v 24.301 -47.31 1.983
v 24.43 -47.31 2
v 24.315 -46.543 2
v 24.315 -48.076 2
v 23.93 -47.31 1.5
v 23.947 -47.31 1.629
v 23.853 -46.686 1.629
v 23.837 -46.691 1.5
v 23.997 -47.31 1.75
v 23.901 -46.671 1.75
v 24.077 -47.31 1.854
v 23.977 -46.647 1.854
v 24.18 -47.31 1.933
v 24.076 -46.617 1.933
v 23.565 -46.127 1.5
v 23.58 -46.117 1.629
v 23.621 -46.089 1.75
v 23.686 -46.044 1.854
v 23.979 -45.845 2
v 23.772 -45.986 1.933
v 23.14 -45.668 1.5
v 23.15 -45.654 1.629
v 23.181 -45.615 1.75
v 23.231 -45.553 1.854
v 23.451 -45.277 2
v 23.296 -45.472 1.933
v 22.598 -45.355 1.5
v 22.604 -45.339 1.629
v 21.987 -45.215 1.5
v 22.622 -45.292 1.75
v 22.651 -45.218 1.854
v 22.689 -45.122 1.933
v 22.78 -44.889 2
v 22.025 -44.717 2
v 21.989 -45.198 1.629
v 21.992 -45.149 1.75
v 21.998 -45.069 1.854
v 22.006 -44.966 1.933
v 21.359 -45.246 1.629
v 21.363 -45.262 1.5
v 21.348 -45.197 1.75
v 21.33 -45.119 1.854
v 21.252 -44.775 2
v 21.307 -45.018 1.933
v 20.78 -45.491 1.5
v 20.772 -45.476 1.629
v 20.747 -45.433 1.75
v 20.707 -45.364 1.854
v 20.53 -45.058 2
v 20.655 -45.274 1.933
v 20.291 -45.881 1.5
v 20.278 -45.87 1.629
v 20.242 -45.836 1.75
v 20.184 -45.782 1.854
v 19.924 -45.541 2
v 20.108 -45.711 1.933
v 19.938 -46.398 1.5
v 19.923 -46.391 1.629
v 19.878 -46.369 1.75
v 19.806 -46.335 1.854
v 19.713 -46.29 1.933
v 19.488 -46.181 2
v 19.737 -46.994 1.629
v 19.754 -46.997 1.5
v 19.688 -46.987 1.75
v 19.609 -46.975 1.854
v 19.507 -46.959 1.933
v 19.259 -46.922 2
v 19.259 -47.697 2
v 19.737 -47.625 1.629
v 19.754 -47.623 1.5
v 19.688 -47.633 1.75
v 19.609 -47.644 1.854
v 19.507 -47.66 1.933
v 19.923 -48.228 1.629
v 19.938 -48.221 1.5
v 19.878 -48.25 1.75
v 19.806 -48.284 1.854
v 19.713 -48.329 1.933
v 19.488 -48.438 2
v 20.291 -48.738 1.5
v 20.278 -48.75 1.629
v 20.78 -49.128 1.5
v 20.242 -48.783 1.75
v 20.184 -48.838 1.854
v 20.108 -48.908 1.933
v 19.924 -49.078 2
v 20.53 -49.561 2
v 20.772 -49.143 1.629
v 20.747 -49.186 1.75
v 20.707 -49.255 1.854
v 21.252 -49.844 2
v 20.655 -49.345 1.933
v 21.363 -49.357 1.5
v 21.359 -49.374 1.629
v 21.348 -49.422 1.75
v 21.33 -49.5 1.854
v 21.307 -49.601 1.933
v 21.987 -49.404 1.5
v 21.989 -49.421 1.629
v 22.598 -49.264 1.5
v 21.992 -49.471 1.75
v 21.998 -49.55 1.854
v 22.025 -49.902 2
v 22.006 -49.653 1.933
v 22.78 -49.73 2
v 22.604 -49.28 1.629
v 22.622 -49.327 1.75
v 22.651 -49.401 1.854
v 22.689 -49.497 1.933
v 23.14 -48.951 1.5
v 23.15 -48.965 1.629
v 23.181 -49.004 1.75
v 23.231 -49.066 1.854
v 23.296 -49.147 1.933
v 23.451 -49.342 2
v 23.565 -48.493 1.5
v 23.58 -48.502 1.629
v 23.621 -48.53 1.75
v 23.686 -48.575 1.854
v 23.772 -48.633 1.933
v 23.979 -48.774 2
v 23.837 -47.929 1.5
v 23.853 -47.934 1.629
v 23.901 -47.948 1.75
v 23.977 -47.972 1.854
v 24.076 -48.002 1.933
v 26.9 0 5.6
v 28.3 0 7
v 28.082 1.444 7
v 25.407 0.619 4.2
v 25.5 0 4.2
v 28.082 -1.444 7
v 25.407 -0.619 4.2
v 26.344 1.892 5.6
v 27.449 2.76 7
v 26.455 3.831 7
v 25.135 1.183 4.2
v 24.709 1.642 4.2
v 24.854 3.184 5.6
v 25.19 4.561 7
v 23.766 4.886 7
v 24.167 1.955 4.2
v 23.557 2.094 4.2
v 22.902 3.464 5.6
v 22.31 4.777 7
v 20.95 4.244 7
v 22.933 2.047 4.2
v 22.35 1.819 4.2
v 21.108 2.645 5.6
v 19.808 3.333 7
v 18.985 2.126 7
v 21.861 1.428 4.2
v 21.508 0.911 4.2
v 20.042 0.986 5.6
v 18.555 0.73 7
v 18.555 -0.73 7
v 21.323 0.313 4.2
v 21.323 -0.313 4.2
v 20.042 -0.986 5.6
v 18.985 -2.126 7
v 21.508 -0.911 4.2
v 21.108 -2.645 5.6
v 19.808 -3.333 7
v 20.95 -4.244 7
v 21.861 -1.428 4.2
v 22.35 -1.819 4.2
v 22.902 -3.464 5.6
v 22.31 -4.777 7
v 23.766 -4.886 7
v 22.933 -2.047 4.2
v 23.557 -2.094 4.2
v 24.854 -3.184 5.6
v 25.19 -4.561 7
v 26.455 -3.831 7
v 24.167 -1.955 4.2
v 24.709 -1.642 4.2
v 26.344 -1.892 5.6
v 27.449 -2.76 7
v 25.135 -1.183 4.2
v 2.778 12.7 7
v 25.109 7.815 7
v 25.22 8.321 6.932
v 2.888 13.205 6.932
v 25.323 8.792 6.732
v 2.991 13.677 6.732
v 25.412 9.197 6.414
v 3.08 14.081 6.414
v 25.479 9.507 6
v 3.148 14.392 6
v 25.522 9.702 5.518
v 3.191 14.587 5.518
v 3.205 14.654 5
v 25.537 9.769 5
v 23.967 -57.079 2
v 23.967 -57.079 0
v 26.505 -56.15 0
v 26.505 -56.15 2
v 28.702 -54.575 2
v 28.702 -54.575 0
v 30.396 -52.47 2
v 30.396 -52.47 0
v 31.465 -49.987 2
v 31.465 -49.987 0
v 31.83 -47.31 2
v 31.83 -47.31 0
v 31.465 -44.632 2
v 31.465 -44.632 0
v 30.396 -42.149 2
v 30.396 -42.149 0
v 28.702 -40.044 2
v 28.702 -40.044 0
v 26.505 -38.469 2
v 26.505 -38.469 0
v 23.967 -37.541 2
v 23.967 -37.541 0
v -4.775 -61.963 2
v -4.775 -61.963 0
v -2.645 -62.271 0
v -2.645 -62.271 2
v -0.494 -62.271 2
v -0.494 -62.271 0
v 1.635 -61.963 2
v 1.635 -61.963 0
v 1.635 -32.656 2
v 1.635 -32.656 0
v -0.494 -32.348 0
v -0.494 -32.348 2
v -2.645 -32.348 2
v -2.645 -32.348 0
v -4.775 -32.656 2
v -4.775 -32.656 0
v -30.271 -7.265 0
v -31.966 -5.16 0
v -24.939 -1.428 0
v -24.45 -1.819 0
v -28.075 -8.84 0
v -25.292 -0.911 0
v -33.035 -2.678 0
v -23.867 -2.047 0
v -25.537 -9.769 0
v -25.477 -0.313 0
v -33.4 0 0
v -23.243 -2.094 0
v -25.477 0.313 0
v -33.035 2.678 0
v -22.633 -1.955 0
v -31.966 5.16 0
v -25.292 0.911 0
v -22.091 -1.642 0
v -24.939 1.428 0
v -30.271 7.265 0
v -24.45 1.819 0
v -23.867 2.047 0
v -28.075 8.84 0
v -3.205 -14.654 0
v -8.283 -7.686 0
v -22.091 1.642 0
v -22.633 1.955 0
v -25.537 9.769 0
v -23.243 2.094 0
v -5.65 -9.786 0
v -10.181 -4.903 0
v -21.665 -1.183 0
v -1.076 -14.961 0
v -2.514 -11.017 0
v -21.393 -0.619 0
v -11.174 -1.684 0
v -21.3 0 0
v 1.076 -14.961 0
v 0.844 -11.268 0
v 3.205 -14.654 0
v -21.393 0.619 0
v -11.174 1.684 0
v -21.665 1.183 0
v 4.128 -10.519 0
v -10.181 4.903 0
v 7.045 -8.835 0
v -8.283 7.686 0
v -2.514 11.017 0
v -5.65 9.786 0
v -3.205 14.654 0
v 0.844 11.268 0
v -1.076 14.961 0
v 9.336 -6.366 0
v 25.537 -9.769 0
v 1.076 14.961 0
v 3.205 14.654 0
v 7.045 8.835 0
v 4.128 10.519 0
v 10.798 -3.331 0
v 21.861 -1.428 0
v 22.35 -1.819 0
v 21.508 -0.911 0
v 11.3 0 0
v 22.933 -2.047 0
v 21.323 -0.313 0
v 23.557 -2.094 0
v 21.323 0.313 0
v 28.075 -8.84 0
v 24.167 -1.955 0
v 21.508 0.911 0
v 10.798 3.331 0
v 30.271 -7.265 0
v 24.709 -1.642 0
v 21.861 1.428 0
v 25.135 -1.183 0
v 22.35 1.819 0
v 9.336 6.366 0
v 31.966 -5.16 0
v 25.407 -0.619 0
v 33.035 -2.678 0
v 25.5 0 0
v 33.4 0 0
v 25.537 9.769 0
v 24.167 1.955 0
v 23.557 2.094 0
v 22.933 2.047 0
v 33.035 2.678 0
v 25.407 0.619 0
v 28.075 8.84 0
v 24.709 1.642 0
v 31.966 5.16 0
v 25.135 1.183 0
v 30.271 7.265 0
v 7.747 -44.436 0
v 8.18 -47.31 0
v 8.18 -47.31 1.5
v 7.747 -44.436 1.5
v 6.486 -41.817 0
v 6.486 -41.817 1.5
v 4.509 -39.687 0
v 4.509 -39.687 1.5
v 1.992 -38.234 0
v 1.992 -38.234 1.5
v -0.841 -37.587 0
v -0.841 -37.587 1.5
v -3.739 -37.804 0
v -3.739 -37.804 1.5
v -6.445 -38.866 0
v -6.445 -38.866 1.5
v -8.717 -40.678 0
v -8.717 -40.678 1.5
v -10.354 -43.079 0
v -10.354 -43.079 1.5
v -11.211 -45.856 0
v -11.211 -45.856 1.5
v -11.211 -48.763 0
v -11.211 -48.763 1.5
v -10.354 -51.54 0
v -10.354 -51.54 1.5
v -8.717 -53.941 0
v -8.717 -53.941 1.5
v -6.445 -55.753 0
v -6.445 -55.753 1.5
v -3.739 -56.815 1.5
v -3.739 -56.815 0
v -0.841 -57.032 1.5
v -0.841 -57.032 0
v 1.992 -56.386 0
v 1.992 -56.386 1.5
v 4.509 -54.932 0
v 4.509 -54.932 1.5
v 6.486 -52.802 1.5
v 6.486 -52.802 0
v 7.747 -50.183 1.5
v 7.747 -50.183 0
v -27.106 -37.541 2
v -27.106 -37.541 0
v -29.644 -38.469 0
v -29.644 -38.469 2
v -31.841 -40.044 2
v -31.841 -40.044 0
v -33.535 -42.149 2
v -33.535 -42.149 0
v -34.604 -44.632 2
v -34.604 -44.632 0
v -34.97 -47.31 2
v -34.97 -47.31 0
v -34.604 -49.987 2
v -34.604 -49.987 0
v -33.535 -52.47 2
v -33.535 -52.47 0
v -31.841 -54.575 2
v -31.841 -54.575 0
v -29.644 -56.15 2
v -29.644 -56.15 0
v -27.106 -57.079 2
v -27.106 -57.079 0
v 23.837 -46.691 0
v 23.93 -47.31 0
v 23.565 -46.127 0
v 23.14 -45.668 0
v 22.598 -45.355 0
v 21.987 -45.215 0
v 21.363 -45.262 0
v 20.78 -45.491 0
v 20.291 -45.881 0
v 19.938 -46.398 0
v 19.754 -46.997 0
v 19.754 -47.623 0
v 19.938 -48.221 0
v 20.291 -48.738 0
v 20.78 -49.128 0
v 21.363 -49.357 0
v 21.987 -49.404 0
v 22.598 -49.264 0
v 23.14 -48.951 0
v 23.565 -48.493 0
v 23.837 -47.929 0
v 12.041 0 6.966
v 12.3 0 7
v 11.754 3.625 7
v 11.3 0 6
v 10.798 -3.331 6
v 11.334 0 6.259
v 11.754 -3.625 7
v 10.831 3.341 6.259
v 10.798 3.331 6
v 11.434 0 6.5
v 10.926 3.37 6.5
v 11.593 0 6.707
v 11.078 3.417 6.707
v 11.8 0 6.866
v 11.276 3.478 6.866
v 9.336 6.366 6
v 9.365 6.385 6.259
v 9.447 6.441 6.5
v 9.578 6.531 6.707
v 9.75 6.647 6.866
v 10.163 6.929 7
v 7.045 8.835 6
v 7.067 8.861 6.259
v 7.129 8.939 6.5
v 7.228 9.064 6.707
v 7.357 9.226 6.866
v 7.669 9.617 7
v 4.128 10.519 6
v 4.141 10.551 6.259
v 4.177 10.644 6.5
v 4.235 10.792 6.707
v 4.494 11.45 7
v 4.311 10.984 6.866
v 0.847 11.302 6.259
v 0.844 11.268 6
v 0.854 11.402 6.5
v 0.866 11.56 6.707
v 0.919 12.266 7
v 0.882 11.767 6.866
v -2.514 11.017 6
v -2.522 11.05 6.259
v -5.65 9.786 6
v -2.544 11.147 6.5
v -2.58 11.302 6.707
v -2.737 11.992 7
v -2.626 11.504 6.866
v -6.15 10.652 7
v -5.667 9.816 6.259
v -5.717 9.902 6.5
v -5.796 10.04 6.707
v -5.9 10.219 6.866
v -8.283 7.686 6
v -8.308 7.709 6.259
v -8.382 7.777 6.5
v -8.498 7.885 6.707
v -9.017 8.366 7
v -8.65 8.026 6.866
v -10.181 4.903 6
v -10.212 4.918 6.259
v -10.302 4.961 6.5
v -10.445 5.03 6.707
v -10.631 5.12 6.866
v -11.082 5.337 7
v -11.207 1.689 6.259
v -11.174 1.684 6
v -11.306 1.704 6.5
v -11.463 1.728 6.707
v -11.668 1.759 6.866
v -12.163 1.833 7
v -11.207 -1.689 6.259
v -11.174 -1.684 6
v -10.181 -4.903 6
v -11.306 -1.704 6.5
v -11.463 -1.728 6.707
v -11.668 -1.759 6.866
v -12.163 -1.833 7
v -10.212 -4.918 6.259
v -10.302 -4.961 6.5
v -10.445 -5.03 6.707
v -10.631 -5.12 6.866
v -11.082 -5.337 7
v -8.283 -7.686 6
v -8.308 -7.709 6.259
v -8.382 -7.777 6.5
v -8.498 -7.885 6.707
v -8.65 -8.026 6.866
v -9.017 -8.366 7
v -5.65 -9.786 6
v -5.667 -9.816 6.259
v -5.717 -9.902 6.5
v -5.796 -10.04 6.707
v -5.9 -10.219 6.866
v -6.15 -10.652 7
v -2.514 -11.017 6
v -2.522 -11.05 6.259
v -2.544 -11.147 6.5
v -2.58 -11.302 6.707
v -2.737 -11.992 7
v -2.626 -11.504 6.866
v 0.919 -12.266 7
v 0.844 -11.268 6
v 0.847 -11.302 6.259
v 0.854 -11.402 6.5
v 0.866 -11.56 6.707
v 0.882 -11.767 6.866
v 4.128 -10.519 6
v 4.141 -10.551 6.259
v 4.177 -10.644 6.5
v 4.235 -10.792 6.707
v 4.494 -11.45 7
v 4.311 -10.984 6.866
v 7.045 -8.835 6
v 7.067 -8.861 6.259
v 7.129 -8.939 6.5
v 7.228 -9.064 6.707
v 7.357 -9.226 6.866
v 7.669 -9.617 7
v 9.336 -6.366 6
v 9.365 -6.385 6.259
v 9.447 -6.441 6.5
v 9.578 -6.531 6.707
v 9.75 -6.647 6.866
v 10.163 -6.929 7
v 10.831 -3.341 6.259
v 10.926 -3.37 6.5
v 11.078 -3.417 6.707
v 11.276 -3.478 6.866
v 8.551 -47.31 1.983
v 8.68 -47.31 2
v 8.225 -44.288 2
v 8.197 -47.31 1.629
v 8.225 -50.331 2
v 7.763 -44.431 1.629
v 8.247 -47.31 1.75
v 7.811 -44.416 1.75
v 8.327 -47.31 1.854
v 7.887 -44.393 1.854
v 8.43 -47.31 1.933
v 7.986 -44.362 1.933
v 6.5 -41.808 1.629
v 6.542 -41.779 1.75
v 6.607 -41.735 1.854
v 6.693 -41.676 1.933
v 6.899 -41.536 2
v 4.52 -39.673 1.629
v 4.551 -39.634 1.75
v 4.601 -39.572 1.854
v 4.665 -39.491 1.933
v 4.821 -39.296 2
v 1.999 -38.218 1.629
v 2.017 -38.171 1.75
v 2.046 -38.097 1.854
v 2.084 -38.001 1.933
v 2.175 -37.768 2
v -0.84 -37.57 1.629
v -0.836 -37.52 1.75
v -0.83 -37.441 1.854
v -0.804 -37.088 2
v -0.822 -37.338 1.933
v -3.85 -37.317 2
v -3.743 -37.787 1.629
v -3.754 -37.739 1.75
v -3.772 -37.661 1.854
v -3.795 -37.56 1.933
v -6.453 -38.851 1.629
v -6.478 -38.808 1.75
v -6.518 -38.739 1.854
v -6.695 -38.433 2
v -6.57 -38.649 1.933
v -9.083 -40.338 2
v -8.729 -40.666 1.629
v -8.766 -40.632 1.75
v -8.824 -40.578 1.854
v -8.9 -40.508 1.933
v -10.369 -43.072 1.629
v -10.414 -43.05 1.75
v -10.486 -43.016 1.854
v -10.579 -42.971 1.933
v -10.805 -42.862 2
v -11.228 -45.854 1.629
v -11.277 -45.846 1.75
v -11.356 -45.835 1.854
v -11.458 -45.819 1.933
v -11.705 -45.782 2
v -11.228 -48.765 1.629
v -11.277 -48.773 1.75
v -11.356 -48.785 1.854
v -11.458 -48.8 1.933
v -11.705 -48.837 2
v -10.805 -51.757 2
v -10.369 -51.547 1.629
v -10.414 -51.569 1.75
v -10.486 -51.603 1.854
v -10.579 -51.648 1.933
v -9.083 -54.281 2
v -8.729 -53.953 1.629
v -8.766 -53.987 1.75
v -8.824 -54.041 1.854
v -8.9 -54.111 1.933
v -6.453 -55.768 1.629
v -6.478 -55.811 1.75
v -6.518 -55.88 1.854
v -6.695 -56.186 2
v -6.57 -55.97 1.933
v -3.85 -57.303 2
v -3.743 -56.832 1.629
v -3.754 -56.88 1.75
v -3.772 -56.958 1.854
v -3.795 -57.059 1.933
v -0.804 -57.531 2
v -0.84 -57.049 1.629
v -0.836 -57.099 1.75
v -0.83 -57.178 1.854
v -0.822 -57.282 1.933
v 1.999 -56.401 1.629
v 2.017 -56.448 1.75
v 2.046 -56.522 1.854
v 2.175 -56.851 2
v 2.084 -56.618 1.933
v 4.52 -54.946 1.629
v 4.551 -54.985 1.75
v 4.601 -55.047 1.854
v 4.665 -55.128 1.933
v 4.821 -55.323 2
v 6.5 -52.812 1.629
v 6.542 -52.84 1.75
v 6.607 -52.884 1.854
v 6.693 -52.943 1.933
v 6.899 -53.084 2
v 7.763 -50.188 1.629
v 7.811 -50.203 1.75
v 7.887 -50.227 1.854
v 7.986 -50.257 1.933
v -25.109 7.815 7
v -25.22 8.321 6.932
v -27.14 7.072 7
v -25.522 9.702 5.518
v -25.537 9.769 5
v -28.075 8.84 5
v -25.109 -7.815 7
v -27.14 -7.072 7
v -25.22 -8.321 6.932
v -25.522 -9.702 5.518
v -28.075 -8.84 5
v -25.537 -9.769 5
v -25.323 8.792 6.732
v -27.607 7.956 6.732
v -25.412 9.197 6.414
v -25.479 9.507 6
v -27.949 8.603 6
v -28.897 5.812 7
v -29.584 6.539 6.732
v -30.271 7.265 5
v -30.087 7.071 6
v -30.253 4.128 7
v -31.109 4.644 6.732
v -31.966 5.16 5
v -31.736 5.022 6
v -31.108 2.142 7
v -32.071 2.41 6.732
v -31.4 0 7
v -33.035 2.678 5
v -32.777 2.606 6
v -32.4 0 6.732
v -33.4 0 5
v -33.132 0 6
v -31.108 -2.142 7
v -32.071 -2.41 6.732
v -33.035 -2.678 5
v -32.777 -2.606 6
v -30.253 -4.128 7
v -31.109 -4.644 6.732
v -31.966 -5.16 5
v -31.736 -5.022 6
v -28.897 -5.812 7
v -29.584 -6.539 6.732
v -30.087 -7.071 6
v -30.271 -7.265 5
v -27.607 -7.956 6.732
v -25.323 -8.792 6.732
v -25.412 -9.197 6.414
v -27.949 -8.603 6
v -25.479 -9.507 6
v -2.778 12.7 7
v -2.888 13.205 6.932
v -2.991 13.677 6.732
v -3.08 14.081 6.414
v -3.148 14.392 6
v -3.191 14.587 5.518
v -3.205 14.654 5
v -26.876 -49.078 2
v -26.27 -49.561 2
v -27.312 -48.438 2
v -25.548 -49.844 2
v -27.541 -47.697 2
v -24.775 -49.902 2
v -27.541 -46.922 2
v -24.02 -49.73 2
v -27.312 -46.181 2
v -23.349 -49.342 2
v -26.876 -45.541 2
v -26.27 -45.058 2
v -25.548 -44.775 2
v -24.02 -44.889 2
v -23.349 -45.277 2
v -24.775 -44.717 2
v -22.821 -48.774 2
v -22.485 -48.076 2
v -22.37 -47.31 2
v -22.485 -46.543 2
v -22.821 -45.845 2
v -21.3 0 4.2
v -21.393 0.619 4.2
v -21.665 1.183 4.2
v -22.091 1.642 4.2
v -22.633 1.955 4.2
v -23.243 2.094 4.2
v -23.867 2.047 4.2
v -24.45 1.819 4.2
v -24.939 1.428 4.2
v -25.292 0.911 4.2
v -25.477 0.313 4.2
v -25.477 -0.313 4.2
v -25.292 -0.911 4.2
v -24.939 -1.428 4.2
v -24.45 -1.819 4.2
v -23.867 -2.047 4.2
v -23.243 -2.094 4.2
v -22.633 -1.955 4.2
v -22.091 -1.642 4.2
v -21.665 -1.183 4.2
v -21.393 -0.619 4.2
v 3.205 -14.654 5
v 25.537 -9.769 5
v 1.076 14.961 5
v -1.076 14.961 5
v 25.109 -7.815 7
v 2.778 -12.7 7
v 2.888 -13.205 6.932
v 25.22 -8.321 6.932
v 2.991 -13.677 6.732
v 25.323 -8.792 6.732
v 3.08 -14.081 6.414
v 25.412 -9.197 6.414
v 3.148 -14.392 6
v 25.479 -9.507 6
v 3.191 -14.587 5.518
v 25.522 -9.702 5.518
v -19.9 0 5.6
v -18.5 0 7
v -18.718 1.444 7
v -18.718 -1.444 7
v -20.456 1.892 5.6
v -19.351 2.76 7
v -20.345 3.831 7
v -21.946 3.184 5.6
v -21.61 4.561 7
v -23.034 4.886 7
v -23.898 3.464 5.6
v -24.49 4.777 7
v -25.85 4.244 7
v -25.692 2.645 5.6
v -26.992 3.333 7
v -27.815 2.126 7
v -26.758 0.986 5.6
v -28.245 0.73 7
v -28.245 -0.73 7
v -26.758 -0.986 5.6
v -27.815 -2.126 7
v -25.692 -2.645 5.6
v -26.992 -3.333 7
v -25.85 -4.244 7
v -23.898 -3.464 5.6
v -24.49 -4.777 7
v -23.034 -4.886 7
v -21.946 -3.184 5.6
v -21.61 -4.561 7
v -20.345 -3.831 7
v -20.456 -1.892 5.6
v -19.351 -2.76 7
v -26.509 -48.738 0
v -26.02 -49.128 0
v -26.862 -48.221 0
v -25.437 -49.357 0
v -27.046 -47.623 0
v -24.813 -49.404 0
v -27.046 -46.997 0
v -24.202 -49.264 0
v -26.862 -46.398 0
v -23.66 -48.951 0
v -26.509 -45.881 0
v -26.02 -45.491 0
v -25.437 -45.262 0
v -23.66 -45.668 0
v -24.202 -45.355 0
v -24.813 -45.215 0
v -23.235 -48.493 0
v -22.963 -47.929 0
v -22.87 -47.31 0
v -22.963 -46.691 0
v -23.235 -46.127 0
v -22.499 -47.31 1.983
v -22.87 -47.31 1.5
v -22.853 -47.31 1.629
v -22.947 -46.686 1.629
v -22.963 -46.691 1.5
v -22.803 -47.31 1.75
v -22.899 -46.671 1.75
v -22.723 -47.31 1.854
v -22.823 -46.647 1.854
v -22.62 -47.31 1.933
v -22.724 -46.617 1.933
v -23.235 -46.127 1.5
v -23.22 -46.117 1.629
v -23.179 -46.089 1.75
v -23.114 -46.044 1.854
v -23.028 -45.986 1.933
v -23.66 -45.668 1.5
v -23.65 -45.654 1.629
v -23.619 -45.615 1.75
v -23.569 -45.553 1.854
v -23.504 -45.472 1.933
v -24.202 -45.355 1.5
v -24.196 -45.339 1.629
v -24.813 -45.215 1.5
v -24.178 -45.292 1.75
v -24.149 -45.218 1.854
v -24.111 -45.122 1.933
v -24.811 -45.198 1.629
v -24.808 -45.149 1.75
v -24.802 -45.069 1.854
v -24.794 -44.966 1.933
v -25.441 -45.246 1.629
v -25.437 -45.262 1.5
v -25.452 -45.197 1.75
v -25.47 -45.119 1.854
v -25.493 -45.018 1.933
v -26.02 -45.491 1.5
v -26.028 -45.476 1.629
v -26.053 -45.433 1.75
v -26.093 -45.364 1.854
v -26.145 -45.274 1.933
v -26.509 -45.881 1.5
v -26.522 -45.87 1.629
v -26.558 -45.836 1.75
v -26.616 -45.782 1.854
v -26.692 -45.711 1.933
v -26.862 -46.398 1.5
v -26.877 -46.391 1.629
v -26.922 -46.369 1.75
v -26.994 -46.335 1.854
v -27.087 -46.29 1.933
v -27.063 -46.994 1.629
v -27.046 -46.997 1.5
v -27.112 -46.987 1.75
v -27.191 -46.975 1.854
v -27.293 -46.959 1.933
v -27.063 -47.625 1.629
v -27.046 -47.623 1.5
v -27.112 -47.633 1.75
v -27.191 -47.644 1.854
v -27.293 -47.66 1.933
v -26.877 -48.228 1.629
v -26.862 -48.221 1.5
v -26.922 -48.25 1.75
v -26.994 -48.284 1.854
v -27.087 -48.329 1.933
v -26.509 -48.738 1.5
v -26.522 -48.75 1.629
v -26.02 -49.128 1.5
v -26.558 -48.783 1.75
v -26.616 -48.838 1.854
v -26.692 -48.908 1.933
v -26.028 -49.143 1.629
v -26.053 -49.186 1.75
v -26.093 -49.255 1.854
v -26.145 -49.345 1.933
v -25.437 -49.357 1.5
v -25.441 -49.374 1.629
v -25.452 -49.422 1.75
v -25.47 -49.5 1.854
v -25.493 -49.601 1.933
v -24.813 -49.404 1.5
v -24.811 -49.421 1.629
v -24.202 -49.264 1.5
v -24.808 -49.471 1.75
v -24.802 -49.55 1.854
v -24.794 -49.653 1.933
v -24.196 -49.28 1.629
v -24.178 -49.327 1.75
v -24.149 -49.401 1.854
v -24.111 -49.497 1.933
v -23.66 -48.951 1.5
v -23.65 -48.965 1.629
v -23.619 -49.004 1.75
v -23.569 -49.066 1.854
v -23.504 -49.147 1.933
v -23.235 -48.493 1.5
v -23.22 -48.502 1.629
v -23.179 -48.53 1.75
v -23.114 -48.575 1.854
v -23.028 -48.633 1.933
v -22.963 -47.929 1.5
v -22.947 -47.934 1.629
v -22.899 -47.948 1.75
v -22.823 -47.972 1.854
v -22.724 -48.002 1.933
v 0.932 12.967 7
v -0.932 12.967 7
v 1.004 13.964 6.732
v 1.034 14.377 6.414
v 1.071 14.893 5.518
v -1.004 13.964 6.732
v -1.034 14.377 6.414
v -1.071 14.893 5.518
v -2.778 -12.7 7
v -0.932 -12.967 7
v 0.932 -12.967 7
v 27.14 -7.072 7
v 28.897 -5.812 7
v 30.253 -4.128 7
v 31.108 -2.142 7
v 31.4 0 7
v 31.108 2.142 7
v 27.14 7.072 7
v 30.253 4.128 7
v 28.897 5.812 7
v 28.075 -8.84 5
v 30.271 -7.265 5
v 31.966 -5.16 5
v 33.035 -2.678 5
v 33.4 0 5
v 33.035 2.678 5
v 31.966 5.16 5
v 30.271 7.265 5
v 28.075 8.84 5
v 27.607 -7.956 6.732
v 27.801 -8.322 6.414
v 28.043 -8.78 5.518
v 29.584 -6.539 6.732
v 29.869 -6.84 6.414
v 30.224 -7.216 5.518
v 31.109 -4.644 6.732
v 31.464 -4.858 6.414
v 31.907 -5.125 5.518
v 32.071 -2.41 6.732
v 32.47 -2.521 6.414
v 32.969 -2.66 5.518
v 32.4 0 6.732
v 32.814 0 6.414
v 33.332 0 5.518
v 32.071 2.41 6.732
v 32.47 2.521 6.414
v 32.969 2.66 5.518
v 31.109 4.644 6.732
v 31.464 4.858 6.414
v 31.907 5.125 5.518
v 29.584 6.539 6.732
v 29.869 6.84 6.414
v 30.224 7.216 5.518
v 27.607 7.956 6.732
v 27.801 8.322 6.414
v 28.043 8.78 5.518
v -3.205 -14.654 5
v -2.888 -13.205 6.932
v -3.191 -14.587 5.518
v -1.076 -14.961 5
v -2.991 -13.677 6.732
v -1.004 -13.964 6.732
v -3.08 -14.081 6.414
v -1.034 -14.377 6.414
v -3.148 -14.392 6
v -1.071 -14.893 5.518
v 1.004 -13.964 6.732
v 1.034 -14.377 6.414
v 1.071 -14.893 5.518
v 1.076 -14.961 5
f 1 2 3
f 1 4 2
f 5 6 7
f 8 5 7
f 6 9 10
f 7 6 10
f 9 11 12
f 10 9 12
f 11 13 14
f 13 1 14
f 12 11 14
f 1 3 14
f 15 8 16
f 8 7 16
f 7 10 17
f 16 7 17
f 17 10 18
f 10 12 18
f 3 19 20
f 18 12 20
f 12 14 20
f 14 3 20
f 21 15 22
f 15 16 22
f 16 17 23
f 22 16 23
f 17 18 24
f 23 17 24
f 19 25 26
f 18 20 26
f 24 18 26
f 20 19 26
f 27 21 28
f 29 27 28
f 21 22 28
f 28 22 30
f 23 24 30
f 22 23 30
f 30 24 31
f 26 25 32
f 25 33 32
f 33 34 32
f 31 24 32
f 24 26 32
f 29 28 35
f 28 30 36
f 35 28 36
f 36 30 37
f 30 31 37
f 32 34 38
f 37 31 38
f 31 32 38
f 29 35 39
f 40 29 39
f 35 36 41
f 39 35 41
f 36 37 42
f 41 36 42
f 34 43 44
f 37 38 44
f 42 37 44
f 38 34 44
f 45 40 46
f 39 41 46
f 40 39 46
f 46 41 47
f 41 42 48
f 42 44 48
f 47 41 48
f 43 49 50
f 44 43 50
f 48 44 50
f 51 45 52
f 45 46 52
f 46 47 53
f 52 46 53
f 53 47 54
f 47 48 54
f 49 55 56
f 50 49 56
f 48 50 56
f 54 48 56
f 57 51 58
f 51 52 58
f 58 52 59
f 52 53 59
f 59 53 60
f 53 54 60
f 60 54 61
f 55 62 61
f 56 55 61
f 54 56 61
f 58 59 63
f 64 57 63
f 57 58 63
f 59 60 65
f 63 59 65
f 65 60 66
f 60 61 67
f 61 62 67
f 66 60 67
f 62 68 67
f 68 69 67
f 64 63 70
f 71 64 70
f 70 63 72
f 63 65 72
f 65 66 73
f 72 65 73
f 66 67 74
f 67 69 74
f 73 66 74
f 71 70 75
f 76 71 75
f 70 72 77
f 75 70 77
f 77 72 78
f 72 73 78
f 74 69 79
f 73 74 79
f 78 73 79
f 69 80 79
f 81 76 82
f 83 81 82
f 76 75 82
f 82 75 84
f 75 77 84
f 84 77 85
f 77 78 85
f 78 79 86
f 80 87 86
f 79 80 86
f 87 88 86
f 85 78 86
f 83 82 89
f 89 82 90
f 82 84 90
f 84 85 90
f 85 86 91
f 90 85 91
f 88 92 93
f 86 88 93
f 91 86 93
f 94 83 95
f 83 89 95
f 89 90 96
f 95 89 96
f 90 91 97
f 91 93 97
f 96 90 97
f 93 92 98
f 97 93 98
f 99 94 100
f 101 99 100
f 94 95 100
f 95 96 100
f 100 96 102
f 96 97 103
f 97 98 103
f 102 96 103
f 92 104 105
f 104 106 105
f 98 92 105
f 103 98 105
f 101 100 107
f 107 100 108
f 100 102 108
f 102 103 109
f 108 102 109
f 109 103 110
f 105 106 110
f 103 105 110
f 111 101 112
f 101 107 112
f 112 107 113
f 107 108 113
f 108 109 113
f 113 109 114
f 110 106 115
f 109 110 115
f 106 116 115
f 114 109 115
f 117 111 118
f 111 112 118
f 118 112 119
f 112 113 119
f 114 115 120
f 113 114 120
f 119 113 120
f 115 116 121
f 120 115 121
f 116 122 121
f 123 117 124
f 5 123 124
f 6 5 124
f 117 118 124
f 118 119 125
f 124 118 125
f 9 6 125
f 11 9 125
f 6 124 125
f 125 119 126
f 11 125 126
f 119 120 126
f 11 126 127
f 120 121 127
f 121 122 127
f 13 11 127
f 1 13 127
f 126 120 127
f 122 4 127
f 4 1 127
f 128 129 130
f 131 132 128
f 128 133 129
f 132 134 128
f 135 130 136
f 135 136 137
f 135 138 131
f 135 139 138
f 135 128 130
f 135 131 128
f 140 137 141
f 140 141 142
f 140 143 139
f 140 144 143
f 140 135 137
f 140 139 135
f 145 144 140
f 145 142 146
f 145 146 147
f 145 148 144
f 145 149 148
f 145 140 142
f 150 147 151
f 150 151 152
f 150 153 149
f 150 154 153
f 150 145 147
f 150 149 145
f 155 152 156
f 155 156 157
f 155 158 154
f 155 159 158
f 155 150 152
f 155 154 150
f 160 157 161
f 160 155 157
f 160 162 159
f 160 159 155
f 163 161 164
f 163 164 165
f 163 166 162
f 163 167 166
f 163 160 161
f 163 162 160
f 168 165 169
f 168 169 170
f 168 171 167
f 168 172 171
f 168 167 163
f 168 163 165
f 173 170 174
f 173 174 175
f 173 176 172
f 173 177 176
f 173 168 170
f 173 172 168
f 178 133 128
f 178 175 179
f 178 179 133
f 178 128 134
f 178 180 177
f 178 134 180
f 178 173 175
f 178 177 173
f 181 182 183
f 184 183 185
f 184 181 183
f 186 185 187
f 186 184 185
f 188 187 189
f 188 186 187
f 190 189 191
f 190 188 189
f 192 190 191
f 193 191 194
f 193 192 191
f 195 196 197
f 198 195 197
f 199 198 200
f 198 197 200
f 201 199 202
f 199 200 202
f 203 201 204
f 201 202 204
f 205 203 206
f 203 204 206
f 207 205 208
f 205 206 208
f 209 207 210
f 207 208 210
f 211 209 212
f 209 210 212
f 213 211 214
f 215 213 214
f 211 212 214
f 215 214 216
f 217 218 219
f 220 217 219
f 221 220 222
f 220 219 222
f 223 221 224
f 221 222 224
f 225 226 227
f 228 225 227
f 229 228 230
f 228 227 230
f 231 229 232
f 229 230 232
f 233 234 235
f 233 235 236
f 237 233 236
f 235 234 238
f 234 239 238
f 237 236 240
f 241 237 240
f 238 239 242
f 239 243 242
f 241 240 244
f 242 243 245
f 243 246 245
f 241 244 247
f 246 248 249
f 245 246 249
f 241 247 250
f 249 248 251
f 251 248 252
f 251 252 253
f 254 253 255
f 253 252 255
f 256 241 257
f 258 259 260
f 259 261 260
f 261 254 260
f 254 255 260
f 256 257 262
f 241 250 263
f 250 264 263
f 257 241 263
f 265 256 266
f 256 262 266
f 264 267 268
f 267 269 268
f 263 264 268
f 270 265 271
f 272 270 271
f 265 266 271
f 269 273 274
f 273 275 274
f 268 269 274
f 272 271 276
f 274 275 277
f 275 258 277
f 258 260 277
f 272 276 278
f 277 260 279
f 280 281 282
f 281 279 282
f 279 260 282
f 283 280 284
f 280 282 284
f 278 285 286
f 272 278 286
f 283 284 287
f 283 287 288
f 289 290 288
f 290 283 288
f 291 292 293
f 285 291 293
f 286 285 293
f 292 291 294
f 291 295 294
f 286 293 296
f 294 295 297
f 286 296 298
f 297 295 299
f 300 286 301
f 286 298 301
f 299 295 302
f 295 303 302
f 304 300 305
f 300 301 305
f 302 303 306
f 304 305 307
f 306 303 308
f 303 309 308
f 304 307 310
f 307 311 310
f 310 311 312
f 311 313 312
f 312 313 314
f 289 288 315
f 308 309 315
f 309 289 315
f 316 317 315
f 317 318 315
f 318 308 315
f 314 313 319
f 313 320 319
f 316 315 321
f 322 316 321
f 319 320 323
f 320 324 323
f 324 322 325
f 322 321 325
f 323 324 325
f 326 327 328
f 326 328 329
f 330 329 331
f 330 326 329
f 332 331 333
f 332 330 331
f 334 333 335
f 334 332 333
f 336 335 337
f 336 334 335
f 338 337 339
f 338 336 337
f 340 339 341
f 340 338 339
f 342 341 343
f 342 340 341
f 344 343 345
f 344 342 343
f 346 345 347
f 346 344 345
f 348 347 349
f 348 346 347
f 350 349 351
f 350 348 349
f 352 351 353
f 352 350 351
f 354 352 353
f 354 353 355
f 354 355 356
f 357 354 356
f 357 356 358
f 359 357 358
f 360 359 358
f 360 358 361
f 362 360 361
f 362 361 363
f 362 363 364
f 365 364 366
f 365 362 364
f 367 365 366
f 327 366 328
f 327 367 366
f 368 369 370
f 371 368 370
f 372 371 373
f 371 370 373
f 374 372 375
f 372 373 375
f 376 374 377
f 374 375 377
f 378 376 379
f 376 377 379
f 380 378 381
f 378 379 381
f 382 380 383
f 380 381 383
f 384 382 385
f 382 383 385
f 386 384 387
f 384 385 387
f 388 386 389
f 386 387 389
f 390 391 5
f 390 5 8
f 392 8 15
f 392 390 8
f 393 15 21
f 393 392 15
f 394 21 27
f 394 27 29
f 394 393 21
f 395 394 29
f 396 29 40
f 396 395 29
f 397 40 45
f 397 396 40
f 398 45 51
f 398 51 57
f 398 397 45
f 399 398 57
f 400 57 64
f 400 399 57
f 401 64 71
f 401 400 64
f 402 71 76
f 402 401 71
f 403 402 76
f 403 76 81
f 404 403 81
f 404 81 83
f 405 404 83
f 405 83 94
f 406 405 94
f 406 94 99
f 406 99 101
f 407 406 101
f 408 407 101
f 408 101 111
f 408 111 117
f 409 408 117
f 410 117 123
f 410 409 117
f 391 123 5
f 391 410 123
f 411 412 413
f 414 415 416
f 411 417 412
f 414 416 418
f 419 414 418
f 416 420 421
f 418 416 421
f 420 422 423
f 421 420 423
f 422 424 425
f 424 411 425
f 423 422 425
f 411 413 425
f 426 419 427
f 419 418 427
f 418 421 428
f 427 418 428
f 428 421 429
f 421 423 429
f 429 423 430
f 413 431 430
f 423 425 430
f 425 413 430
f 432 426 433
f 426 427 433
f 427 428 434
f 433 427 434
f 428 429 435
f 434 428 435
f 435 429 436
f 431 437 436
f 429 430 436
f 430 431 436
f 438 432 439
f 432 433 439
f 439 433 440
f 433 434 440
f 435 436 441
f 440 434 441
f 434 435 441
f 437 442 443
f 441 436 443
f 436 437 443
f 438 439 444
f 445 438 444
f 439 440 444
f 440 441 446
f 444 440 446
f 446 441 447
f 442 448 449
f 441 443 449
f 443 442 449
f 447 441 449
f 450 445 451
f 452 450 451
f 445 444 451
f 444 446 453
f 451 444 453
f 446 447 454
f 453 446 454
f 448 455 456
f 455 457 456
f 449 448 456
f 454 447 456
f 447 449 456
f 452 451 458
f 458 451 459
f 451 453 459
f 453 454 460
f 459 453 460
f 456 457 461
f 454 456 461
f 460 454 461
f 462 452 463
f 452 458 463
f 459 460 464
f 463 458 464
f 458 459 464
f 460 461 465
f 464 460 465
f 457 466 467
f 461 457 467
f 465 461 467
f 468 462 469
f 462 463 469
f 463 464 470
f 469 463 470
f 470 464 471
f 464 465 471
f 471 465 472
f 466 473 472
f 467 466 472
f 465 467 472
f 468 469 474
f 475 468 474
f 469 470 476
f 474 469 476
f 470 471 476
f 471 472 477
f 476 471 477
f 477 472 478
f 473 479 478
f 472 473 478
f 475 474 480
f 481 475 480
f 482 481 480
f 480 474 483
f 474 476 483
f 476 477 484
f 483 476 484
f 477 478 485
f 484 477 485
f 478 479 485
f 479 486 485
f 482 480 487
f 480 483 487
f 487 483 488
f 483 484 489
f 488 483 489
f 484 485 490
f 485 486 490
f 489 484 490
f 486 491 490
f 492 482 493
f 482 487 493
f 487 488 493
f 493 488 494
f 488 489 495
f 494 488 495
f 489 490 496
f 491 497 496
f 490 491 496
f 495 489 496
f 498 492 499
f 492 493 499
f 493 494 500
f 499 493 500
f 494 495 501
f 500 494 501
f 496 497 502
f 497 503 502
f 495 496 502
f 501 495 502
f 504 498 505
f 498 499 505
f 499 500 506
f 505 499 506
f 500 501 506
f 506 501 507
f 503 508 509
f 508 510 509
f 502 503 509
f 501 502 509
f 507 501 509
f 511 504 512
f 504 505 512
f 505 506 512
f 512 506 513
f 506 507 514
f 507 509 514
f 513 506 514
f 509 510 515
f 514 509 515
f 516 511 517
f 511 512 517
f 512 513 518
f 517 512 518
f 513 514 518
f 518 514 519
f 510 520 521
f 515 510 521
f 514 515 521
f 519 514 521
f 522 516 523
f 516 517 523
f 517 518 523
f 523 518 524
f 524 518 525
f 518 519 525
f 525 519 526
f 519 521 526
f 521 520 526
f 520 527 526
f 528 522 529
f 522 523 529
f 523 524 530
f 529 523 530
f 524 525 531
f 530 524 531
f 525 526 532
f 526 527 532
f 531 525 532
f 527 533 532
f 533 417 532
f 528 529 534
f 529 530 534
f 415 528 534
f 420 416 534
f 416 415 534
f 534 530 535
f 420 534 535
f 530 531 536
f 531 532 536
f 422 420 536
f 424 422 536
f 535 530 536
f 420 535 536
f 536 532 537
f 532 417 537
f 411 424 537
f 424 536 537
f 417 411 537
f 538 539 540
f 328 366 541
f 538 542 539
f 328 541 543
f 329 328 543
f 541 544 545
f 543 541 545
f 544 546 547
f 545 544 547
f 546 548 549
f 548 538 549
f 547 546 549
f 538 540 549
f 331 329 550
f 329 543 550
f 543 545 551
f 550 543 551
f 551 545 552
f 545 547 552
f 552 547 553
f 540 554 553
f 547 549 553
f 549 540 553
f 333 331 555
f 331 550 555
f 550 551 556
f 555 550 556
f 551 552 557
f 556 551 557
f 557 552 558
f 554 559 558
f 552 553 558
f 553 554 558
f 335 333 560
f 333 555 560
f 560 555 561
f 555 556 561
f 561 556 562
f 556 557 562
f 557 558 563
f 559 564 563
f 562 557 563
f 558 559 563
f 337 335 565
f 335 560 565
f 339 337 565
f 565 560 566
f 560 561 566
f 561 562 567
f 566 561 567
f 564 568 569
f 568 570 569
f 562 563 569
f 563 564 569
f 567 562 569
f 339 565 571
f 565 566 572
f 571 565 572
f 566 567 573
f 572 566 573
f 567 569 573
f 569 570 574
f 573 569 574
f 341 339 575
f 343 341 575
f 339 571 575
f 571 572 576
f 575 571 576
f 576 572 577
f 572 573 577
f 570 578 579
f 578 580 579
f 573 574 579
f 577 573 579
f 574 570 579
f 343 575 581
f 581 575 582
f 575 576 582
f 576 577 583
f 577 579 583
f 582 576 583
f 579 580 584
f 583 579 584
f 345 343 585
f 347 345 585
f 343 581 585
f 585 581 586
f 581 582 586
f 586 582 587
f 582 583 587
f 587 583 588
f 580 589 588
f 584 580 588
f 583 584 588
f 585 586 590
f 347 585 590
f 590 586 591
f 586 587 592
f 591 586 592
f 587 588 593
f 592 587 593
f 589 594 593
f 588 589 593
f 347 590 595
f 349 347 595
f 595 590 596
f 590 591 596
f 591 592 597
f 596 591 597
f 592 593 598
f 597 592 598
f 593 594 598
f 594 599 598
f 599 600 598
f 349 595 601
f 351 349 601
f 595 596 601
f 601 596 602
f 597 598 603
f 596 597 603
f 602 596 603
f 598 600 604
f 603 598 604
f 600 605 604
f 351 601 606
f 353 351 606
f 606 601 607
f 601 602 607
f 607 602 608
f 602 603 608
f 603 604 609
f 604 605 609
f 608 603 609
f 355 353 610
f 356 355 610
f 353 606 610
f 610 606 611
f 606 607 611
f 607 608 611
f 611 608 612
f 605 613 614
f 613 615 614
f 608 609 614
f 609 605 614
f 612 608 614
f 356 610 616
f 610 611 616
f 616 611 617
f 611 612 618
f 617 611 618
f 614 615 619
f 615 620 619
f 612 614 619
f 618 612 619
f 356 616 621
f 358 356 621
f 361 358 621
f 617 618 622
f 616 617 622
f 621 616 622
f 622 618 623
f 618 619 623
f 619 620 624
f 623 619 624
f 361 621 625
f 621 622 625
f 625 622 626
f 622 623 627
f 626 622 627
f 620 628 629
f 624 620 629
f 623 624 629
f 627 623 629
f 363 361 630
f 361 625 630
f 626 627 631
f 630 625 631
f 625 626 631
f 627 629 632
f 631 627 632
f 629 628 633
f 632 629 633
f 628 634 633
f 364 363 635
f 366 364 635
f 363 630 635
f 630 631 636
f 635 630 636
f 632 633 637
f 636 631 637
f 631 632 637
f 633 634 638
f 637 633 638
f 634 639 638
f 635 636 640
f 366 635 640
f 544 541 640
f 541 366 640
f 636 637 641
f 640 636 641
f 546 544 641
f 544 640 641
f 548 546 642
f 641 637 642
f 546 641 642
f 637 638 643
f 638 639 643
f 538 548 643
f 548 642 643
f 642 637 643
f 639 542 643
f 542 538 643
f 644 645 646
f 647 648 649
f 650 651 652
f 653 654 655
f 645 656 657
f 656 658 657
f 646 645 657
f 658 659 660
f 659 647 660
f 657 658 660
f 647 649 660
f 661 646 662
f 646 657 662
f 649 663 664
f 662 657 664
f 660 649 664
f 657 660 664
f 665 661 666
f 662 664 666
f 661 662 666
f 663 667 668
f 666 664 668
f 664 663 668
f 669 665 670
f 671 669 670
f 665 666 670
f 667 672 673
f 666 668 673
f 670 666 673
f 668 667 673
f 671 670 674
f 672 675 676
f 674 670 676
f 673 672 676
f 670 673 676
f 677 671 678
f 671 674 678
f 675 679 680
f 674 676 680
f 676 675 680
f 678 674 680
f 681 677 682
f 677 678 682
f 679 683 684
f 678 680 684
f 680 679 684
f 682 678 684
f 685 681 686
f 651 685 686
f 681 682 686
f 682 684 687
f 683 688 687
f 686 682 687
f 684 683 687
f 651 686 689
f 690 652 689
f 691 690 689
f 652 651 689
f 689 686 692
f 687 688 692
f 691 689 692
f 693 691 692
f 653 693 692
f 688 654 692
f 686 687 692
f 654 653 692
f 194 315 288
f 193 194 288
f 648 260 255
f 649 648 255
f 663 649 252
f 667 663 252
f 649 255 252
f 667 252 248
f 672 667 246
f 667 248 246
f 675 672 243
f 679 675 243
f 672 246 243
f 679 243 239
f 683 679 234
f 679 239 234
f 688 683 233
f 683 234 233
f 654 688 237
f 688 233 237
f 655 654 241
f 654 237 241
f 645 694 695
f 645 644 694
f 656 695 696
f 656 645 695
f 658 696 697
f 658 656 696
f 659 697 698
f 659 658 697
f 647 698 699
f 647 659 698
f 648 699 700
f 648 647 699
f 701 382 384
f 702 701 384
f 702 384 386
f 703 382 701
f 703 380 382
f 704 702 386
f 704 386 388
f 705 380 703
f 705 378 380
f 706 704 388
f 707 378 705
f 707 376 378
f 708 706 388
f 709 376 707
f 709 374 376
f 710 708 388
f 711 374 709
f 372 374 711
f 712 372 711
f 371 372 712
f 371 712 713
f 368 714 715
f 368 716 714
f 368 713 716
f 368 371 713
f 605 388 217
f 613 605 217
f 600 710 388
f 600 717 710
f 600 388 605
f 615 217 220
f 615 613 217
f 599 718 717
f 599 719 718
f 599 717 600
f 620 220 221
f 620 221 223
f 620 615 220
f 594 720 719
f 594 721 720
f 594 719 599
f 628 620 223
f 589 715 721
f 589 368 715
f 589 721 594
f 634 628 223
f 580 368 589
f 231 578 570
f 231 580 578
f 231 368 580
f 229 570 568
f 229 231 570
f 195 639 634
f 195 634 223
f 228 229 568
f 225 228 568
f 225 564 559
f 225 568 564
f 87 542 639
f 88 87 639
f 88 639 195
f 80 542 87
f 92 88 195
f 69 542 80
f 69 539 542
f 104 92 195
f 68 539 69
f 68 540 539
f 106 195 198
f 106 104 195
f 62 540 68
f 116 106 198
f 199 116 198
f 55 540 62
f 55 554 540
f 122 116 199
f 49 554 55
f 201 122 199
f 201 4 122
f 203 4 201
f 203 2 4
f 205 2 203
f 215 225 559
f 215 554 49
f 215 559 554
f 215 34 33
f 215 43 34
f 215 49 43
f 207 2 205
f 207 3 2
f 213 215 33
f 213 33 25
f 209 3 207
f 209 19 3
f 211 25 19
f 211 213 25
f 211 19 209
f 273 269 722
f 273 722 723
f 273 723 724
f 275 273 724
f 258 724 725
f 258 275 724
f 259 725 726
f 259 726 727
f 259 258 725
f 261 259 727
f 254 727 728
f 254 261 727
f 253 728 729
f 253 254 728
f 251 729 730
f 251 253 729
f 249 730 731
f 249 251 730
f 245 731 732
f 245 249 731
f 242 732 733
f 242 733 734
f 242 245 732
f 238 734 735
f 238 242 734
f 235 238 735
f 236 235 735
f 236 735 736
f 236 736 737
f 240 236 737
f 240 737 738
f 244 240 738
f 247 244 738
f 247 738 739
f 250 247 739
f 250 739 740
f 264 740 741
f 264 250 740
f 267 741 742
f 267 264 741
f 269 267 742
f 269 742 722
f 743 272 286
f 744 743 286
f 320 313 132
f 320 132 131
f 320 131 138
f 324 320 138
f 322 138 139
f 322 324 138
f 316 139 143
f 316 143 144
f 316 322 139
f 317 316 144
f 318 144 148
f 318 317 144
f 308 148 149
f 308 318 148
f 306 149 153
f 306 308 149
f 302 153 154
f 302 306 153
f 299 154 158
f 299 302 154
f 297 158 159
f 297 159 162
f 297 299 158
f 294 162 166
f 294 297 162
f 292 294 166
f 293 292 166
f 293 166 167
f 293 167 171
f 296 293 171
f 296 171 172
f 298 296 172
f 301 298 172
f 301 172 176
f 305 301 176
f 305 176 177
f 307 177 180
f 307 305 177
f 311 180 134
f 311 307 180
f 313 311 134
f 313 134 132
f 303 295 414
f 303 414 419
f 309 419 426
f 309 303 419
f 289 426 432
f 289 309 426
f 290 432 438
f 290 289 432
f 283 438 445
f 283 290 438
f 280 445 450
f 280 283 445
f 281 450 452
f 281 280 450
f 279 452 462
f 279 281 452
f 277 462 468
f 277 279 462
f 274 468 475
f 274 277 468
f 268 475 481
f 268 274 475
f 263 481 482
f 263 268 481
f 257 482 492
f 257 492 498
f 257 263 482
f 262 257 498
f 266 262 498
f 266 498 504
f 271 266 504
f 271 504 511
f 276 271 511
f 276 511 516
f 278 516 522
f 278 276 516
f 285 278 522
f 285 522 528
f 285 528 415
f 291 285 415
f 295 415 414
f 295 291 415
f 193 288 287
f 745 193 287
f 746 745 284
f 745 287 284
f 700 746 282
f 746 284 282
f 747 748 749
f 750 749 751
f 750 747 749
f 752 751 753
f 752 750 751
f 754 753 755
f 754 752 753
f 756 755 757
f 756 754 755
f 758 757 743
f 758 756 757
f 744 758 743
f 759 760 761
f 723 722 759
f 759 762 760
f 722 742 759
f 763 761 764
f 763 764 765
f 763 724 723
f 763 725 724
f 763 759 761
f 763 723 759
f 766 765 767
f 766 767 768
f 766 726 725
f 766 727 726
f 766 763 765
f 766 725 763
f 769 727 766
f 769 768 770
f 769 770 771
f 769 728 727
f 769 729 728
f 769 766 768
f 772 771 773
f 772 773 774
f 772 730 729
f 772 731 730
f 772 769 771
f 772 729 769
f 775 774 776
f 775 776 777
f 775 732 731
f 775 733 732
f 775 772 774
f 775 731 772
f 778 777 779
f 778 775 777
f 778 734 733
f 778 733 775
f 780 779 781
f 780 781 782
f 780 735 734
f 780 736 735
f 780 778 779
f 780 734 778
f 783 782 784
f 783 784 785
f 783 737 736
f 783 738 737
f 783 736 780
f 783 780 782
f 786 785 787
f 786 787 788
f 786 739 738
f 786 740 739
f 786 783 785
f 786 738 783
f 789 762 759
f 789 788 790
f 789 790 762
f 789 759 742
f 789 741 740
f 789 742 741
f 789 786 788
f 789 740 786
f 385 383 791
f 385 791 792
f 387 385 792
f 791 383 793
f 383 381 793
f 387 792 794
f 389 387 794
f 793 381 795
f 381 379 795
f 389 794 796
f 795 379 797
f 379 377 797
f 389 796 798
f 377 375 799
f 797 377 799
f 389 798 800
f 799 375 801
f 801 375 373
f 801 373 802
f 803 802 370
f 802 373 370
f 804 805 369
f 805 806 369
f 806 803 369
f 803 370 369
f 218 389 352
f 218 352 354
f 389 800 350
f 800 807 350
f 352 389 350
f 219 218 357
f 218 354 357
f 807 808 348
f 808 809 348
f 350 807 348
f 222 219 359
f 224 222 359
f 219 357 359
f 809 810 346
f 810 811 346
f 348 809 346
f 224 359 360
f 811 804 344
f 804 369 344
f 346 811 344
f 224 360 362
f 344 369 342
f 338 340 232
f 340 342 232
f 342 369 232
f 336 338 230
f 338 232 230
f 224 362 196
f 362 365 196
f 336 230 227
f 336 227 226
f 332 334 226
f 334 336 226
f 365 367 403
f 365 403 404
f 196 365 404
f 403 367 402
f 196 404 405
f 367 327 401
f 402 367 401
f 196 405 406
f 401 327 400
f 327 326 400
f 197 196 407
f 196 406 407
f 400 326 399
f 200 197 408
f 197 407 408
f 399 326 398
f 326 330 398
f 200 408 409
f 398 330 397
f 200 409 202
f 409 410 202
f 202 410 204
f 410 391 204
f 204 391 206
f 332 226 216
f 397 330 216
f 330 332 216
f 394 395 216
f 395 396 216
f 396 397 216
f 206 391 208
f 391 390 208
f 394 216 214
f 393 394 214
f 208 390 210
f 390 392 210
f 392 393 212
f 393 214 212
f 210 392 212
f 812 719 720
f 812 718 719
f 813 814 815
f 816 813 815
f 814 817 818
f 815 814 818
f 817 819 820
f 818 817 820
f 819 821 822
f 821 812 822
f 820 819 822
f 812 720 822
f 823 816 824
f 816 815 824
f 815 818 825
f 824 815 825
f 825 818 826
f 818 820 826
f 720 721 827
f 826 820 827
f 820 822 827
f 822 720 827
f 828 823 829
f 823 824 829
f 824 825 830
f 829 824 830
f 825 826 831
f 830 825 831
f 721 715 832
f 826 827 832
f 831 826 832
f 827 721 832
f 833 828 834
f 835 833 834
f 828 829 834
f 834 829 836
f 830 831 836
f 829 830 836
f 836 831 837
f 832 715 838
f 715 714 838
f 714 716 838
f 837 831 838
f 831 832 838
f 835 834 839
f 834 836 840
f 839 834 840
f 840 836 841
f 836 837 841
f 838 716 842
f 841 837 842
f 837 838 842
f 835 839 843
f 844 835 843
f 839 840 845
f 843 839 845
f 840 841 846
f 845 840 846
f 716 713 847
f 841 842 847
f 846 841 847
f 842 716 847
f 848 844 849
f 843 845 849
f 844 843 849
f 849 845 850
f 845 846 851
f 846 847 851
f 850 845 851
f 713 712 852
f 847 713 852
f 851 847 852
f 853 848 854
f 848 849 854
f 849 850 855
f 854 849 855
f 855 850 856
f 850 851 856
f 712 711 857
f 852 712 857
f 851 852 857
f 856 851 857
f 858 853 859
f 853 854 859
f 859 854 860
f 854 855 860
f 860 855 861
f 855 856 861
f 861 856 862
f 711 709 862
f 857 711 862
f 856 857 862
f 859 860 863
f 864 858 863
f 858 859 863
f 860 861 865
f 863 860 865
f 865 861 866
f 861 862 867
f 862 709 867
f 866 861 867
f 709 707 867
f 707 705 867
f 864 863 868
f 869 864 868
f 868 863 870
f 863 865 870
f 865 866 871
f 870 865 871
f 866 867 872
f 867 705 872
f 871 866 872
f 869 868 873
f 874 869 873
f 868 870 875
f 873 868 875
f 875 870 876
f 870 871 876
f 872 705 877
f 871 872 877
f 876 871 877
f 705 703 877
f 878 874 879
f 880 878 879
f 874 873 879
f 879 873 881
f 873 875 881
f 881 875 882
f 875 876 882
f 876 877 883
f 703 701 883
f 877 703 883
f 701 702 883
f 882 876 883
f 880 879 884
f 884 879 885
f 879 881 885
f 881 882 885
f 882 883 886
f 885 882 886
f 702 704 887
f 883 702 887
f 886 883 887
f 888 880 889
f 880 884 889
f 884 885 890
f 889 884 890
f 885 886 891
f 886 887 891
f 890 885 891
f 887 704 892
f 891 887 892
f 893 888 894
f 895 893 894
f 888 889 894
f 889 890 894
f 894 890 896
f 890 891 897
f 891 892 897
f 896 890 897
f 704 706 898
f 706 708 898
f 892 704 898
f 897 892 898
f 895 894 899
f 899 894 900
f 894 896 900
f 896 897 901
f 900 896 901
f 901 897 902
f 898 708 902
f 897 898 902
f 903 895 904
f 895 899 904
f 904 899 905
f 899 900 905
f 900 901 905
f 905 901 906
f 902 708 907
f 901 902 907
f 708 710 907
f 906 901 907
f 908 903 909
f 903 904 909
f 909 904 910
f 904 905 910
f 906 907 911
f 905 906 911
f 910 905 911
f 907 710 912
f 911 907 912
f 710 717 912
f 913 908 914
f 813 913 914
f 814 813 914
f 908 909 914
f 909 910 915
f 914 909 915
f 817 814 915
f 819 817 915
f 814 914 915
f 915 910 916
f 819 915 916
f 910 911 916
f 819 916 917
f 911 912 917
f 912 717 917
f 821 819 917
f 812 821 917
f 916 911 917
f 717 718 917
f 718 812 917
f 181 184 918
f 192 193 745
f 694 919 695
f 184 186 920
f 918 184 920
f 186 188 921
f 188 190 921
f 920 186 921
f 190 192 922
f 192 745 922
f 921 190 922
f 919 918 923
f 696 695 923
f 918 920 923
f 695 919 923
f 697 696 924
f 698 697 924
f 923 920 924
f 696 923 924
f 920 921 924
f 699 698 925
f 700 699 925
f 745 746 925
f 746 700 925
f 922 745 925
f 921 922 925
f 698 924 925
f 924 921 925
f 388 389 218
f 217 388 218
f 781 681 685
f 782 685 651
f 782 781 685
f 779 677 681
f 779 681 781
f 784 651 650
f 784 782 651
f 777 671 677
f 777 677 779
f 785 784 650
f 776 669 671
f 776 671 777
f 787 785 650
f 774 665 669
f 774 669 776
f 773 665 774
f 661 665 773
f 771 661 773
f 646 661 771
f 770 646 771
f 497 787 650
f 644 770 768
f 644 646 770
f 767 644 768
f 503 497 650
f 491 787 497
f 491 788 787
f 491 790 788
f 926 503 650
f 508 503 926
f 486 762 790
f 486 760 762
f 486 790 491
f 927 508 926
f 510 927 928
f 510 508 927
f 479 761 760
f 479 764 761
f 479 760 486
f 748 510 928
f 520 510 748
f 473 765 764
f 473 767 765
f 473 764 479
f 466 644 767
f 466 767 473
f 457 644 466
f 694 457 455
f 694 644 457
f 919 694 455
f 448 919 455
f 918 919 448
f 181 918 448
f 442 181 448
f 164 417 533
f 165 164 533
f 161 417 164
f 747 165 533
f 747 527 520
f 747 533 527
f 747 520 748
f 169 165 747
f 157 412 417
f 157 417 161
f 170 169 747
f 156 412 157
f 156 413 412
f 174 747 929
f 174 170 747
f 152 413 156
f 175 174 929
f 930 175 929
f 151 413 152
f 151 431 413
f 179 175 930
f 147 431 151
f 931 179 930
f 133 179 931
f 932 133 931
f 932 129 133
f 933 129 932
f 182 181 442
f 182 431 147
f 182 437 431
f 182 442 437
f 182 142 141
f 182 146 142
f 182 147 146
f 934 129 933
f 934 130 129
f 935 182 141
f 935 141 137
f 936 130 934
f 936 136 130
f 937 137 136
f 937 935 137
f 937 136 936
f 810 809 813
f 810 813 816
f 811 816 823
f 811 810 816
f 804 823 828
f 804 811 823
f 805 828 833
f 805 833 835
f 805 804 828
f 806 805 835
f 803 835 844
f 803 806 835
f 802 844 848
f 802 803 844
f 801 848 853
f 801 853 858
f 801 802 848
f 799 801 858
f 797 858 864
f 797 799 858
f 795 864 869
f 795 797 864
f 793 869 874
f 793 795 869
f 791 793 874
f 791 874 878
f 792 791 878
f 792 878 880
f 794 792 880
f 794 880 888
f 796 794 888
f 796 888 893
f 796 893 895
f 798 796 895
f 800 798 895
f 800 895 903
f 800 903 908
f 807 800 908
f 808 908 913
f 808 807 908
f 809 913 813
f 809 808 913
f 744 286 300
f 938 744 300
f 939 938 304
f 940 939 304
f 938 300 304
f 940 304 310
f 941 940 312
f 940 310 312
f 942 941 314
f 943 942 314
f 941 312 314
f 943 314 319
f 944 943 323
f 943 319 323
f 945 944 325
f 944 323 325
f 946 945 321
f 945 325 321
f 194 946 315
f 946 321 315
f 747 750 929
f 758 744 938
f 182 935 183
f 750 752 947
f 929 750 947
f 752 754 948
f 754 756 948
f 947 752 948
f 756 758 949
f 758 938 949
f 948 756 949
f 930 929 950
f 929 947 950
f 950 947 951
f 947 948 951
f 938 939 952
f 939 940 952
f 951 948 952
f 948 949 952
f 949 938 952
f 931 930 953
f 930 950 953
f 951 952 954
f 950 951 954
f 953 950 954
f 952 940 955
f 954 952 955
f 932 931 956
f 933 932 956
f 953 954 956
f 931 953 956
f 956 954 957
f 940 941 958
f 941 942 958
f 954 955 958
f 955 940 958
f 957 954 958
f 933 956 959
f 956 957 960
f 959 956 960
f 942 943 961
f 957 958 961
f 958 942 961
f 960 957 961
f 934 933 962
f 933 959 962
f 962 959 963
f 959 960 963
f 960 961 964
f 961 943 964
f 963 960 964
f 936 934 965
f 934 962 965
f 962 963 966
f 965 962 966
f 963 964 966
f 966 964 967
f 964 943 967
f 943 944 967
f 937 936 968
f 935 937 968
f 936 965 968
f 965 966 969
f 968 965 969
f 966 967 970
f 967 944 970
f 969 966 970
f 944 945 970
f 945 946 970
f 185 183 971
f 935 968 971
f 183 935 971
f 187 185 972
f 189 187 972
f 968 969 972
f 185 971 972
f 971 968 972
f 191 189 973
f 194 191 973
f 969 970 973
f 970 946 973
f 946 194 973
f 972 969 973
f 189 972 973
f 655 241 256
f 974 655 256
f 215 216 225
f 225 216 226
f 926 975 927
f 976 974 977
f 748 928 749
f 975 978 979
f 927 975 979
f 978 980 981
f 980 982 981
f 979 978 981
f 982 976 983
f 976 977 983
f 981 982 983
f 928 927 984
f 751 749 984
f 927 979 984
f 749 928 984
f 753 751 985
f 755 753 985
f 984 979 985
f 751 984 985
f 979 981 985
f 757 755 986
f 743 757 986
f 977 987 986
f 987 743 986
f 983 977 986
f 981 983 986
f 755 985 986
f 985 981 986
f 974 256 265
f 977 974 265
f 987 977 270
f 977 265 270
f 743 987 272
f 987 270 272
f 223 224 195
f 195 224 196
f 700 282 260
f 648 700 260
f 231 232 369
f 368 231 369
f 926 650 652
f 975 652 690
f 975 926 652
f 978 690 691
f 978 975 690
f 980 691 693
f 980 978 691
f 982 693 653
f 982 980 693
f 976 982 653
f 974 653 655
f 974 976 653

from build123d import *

# Parameters (mm, degrees)
F0_R     = 2.1
F0_R_2   = 11.3
F1_DEPTH = 7
F2_R     = 1
F3_R     = 2
F4_SIZE  = 2.8
F5_R     = 2.1
F5_R_2   = 9.75
F6_DEPTH = 2
F7_R     = 0.5


with BuildPart() as f1:
    # F0 (on Top) → F1 (new body)
    with BuildSketch(Plane.XY):
        with BuildLine():
            Line((-25.536752, -9.769048), (-3.205128, -14.653571))
            ThreePointArc((-3.205128, -14.653571), (0, -15), (3.205128, -14.653571))
            Line((3.205128, -14.653571), (25.536752, -9.769048))
            ThreePointArc((25.536752, -9.769048), (33.4, 0), (25.536752, 9.769048))
            Line((25.536752, 9.769048), (3.205128, 14.653571))
            ThreePointArc((3.205128, 14.653571), (0, 15), (-3.205128, 14.653571))
            Line((-3.205128, 14.653571), (-25.536752, 9.769048))
            ThreePointArc((-25.536752, 9.769048), (-33.4, 0), (-25.536752, -9.769048))
        make_face()
        with Locations((-23.4, 0)):
            Circle(F0_R, mode=Mode.SUBTRACT)
        Circle(F0_R_2, mode=Mode.SUBTRACT)
        with Locations((23.4, 0)):
            Circle(F0_R, mode=Mode.SUBTRACT)
    extrude(amount=F1_DEPTH)

    # F2
    f2_edges = [f1.edges().sort_by_distance(p)[0] for p in [
        (-11.3, 0, 7),
    ]]
    fillet(f2_edges, radius=F2_R)

    # F3
    f3_edges = [f1.edges().sort_by_distance(p)[0] for p in [
        (-33.4, 0, 7),
        (-14.37094, -12.211309, 7),
        (-14.37094, 12.211309, 7),
        (0, -15, 7),
        (14.37094, -12.211309, 7),
        (33.4, 0, 7),
        (14.37094, 12.211309, 7),
        (0, 15, 7),
    ]]
    fillet(f3_edges, radius=F3_R)

    # F4
    f4_edges = [f1.edges().sort_by_distance(p)[0] for p in [
        (-25.5, 0, 7),
        (21.3, 0, 7),
    ]]
    chamfer(f4_edges, length=F4_SIZE)


with BuildPart() as f6:
    # F5 (on Top) → F6 (new body)
    with BuildSketch(Plane.XY):
        with BuildLine():
            Line((-27.106382, -57.078621), (-4.774758, -61.963145))
            ThreePointArc((-4.774758, -61.963145), (-1.56963, -62.309574), (1.635498, -61.963145))
            Line((1.635498, -61.963145), (23.967122, -57.078621))
            ThreePointArc((23.967122, -57.078621), (31.83037, -47.309574), (23.967122, -37.540526))
            Line((23.967122, -37.540526), (1.635498, -32.656002))
            ThreePointArc((1.635498, -32.656002), (-1.56963, -32.309574), (-4.774758, -32.656002))
            Line((-4.774758, -32.656002), (-27.106382, -37.540526))
            ThreePointArc((-27.106382, -37.540526), (-34.96963, -47.309574), (-27.106382, -57.078621))
        make_face()
        with Locations((-24.96963, -47.309574)):
            Circle(F5_R, mode=Mode.SUBTRACT)
        with Locations((-1.56963, -47.309574)):
            Circle(F5_R_2, mode=Mode.SUBTRACT)
        with Locations((21.83037, -47.309574)):
            Circle(F5_R, mode=Mode.SUBTRACT)
    extrude(amount=F6_DEPTH)

    # F7
    f7_edges = [f6.edges().sort_by_distance(p)[0] for p in [
        (-27.06963, -47.309574, 2),
        (-11.31963, -47.309574, 2),
        (19.73037, -47.309574, 2),
    ]]
    fillet(f7_edges, radius=F7_R)


solid = Compound([f1.part, f6.part])
